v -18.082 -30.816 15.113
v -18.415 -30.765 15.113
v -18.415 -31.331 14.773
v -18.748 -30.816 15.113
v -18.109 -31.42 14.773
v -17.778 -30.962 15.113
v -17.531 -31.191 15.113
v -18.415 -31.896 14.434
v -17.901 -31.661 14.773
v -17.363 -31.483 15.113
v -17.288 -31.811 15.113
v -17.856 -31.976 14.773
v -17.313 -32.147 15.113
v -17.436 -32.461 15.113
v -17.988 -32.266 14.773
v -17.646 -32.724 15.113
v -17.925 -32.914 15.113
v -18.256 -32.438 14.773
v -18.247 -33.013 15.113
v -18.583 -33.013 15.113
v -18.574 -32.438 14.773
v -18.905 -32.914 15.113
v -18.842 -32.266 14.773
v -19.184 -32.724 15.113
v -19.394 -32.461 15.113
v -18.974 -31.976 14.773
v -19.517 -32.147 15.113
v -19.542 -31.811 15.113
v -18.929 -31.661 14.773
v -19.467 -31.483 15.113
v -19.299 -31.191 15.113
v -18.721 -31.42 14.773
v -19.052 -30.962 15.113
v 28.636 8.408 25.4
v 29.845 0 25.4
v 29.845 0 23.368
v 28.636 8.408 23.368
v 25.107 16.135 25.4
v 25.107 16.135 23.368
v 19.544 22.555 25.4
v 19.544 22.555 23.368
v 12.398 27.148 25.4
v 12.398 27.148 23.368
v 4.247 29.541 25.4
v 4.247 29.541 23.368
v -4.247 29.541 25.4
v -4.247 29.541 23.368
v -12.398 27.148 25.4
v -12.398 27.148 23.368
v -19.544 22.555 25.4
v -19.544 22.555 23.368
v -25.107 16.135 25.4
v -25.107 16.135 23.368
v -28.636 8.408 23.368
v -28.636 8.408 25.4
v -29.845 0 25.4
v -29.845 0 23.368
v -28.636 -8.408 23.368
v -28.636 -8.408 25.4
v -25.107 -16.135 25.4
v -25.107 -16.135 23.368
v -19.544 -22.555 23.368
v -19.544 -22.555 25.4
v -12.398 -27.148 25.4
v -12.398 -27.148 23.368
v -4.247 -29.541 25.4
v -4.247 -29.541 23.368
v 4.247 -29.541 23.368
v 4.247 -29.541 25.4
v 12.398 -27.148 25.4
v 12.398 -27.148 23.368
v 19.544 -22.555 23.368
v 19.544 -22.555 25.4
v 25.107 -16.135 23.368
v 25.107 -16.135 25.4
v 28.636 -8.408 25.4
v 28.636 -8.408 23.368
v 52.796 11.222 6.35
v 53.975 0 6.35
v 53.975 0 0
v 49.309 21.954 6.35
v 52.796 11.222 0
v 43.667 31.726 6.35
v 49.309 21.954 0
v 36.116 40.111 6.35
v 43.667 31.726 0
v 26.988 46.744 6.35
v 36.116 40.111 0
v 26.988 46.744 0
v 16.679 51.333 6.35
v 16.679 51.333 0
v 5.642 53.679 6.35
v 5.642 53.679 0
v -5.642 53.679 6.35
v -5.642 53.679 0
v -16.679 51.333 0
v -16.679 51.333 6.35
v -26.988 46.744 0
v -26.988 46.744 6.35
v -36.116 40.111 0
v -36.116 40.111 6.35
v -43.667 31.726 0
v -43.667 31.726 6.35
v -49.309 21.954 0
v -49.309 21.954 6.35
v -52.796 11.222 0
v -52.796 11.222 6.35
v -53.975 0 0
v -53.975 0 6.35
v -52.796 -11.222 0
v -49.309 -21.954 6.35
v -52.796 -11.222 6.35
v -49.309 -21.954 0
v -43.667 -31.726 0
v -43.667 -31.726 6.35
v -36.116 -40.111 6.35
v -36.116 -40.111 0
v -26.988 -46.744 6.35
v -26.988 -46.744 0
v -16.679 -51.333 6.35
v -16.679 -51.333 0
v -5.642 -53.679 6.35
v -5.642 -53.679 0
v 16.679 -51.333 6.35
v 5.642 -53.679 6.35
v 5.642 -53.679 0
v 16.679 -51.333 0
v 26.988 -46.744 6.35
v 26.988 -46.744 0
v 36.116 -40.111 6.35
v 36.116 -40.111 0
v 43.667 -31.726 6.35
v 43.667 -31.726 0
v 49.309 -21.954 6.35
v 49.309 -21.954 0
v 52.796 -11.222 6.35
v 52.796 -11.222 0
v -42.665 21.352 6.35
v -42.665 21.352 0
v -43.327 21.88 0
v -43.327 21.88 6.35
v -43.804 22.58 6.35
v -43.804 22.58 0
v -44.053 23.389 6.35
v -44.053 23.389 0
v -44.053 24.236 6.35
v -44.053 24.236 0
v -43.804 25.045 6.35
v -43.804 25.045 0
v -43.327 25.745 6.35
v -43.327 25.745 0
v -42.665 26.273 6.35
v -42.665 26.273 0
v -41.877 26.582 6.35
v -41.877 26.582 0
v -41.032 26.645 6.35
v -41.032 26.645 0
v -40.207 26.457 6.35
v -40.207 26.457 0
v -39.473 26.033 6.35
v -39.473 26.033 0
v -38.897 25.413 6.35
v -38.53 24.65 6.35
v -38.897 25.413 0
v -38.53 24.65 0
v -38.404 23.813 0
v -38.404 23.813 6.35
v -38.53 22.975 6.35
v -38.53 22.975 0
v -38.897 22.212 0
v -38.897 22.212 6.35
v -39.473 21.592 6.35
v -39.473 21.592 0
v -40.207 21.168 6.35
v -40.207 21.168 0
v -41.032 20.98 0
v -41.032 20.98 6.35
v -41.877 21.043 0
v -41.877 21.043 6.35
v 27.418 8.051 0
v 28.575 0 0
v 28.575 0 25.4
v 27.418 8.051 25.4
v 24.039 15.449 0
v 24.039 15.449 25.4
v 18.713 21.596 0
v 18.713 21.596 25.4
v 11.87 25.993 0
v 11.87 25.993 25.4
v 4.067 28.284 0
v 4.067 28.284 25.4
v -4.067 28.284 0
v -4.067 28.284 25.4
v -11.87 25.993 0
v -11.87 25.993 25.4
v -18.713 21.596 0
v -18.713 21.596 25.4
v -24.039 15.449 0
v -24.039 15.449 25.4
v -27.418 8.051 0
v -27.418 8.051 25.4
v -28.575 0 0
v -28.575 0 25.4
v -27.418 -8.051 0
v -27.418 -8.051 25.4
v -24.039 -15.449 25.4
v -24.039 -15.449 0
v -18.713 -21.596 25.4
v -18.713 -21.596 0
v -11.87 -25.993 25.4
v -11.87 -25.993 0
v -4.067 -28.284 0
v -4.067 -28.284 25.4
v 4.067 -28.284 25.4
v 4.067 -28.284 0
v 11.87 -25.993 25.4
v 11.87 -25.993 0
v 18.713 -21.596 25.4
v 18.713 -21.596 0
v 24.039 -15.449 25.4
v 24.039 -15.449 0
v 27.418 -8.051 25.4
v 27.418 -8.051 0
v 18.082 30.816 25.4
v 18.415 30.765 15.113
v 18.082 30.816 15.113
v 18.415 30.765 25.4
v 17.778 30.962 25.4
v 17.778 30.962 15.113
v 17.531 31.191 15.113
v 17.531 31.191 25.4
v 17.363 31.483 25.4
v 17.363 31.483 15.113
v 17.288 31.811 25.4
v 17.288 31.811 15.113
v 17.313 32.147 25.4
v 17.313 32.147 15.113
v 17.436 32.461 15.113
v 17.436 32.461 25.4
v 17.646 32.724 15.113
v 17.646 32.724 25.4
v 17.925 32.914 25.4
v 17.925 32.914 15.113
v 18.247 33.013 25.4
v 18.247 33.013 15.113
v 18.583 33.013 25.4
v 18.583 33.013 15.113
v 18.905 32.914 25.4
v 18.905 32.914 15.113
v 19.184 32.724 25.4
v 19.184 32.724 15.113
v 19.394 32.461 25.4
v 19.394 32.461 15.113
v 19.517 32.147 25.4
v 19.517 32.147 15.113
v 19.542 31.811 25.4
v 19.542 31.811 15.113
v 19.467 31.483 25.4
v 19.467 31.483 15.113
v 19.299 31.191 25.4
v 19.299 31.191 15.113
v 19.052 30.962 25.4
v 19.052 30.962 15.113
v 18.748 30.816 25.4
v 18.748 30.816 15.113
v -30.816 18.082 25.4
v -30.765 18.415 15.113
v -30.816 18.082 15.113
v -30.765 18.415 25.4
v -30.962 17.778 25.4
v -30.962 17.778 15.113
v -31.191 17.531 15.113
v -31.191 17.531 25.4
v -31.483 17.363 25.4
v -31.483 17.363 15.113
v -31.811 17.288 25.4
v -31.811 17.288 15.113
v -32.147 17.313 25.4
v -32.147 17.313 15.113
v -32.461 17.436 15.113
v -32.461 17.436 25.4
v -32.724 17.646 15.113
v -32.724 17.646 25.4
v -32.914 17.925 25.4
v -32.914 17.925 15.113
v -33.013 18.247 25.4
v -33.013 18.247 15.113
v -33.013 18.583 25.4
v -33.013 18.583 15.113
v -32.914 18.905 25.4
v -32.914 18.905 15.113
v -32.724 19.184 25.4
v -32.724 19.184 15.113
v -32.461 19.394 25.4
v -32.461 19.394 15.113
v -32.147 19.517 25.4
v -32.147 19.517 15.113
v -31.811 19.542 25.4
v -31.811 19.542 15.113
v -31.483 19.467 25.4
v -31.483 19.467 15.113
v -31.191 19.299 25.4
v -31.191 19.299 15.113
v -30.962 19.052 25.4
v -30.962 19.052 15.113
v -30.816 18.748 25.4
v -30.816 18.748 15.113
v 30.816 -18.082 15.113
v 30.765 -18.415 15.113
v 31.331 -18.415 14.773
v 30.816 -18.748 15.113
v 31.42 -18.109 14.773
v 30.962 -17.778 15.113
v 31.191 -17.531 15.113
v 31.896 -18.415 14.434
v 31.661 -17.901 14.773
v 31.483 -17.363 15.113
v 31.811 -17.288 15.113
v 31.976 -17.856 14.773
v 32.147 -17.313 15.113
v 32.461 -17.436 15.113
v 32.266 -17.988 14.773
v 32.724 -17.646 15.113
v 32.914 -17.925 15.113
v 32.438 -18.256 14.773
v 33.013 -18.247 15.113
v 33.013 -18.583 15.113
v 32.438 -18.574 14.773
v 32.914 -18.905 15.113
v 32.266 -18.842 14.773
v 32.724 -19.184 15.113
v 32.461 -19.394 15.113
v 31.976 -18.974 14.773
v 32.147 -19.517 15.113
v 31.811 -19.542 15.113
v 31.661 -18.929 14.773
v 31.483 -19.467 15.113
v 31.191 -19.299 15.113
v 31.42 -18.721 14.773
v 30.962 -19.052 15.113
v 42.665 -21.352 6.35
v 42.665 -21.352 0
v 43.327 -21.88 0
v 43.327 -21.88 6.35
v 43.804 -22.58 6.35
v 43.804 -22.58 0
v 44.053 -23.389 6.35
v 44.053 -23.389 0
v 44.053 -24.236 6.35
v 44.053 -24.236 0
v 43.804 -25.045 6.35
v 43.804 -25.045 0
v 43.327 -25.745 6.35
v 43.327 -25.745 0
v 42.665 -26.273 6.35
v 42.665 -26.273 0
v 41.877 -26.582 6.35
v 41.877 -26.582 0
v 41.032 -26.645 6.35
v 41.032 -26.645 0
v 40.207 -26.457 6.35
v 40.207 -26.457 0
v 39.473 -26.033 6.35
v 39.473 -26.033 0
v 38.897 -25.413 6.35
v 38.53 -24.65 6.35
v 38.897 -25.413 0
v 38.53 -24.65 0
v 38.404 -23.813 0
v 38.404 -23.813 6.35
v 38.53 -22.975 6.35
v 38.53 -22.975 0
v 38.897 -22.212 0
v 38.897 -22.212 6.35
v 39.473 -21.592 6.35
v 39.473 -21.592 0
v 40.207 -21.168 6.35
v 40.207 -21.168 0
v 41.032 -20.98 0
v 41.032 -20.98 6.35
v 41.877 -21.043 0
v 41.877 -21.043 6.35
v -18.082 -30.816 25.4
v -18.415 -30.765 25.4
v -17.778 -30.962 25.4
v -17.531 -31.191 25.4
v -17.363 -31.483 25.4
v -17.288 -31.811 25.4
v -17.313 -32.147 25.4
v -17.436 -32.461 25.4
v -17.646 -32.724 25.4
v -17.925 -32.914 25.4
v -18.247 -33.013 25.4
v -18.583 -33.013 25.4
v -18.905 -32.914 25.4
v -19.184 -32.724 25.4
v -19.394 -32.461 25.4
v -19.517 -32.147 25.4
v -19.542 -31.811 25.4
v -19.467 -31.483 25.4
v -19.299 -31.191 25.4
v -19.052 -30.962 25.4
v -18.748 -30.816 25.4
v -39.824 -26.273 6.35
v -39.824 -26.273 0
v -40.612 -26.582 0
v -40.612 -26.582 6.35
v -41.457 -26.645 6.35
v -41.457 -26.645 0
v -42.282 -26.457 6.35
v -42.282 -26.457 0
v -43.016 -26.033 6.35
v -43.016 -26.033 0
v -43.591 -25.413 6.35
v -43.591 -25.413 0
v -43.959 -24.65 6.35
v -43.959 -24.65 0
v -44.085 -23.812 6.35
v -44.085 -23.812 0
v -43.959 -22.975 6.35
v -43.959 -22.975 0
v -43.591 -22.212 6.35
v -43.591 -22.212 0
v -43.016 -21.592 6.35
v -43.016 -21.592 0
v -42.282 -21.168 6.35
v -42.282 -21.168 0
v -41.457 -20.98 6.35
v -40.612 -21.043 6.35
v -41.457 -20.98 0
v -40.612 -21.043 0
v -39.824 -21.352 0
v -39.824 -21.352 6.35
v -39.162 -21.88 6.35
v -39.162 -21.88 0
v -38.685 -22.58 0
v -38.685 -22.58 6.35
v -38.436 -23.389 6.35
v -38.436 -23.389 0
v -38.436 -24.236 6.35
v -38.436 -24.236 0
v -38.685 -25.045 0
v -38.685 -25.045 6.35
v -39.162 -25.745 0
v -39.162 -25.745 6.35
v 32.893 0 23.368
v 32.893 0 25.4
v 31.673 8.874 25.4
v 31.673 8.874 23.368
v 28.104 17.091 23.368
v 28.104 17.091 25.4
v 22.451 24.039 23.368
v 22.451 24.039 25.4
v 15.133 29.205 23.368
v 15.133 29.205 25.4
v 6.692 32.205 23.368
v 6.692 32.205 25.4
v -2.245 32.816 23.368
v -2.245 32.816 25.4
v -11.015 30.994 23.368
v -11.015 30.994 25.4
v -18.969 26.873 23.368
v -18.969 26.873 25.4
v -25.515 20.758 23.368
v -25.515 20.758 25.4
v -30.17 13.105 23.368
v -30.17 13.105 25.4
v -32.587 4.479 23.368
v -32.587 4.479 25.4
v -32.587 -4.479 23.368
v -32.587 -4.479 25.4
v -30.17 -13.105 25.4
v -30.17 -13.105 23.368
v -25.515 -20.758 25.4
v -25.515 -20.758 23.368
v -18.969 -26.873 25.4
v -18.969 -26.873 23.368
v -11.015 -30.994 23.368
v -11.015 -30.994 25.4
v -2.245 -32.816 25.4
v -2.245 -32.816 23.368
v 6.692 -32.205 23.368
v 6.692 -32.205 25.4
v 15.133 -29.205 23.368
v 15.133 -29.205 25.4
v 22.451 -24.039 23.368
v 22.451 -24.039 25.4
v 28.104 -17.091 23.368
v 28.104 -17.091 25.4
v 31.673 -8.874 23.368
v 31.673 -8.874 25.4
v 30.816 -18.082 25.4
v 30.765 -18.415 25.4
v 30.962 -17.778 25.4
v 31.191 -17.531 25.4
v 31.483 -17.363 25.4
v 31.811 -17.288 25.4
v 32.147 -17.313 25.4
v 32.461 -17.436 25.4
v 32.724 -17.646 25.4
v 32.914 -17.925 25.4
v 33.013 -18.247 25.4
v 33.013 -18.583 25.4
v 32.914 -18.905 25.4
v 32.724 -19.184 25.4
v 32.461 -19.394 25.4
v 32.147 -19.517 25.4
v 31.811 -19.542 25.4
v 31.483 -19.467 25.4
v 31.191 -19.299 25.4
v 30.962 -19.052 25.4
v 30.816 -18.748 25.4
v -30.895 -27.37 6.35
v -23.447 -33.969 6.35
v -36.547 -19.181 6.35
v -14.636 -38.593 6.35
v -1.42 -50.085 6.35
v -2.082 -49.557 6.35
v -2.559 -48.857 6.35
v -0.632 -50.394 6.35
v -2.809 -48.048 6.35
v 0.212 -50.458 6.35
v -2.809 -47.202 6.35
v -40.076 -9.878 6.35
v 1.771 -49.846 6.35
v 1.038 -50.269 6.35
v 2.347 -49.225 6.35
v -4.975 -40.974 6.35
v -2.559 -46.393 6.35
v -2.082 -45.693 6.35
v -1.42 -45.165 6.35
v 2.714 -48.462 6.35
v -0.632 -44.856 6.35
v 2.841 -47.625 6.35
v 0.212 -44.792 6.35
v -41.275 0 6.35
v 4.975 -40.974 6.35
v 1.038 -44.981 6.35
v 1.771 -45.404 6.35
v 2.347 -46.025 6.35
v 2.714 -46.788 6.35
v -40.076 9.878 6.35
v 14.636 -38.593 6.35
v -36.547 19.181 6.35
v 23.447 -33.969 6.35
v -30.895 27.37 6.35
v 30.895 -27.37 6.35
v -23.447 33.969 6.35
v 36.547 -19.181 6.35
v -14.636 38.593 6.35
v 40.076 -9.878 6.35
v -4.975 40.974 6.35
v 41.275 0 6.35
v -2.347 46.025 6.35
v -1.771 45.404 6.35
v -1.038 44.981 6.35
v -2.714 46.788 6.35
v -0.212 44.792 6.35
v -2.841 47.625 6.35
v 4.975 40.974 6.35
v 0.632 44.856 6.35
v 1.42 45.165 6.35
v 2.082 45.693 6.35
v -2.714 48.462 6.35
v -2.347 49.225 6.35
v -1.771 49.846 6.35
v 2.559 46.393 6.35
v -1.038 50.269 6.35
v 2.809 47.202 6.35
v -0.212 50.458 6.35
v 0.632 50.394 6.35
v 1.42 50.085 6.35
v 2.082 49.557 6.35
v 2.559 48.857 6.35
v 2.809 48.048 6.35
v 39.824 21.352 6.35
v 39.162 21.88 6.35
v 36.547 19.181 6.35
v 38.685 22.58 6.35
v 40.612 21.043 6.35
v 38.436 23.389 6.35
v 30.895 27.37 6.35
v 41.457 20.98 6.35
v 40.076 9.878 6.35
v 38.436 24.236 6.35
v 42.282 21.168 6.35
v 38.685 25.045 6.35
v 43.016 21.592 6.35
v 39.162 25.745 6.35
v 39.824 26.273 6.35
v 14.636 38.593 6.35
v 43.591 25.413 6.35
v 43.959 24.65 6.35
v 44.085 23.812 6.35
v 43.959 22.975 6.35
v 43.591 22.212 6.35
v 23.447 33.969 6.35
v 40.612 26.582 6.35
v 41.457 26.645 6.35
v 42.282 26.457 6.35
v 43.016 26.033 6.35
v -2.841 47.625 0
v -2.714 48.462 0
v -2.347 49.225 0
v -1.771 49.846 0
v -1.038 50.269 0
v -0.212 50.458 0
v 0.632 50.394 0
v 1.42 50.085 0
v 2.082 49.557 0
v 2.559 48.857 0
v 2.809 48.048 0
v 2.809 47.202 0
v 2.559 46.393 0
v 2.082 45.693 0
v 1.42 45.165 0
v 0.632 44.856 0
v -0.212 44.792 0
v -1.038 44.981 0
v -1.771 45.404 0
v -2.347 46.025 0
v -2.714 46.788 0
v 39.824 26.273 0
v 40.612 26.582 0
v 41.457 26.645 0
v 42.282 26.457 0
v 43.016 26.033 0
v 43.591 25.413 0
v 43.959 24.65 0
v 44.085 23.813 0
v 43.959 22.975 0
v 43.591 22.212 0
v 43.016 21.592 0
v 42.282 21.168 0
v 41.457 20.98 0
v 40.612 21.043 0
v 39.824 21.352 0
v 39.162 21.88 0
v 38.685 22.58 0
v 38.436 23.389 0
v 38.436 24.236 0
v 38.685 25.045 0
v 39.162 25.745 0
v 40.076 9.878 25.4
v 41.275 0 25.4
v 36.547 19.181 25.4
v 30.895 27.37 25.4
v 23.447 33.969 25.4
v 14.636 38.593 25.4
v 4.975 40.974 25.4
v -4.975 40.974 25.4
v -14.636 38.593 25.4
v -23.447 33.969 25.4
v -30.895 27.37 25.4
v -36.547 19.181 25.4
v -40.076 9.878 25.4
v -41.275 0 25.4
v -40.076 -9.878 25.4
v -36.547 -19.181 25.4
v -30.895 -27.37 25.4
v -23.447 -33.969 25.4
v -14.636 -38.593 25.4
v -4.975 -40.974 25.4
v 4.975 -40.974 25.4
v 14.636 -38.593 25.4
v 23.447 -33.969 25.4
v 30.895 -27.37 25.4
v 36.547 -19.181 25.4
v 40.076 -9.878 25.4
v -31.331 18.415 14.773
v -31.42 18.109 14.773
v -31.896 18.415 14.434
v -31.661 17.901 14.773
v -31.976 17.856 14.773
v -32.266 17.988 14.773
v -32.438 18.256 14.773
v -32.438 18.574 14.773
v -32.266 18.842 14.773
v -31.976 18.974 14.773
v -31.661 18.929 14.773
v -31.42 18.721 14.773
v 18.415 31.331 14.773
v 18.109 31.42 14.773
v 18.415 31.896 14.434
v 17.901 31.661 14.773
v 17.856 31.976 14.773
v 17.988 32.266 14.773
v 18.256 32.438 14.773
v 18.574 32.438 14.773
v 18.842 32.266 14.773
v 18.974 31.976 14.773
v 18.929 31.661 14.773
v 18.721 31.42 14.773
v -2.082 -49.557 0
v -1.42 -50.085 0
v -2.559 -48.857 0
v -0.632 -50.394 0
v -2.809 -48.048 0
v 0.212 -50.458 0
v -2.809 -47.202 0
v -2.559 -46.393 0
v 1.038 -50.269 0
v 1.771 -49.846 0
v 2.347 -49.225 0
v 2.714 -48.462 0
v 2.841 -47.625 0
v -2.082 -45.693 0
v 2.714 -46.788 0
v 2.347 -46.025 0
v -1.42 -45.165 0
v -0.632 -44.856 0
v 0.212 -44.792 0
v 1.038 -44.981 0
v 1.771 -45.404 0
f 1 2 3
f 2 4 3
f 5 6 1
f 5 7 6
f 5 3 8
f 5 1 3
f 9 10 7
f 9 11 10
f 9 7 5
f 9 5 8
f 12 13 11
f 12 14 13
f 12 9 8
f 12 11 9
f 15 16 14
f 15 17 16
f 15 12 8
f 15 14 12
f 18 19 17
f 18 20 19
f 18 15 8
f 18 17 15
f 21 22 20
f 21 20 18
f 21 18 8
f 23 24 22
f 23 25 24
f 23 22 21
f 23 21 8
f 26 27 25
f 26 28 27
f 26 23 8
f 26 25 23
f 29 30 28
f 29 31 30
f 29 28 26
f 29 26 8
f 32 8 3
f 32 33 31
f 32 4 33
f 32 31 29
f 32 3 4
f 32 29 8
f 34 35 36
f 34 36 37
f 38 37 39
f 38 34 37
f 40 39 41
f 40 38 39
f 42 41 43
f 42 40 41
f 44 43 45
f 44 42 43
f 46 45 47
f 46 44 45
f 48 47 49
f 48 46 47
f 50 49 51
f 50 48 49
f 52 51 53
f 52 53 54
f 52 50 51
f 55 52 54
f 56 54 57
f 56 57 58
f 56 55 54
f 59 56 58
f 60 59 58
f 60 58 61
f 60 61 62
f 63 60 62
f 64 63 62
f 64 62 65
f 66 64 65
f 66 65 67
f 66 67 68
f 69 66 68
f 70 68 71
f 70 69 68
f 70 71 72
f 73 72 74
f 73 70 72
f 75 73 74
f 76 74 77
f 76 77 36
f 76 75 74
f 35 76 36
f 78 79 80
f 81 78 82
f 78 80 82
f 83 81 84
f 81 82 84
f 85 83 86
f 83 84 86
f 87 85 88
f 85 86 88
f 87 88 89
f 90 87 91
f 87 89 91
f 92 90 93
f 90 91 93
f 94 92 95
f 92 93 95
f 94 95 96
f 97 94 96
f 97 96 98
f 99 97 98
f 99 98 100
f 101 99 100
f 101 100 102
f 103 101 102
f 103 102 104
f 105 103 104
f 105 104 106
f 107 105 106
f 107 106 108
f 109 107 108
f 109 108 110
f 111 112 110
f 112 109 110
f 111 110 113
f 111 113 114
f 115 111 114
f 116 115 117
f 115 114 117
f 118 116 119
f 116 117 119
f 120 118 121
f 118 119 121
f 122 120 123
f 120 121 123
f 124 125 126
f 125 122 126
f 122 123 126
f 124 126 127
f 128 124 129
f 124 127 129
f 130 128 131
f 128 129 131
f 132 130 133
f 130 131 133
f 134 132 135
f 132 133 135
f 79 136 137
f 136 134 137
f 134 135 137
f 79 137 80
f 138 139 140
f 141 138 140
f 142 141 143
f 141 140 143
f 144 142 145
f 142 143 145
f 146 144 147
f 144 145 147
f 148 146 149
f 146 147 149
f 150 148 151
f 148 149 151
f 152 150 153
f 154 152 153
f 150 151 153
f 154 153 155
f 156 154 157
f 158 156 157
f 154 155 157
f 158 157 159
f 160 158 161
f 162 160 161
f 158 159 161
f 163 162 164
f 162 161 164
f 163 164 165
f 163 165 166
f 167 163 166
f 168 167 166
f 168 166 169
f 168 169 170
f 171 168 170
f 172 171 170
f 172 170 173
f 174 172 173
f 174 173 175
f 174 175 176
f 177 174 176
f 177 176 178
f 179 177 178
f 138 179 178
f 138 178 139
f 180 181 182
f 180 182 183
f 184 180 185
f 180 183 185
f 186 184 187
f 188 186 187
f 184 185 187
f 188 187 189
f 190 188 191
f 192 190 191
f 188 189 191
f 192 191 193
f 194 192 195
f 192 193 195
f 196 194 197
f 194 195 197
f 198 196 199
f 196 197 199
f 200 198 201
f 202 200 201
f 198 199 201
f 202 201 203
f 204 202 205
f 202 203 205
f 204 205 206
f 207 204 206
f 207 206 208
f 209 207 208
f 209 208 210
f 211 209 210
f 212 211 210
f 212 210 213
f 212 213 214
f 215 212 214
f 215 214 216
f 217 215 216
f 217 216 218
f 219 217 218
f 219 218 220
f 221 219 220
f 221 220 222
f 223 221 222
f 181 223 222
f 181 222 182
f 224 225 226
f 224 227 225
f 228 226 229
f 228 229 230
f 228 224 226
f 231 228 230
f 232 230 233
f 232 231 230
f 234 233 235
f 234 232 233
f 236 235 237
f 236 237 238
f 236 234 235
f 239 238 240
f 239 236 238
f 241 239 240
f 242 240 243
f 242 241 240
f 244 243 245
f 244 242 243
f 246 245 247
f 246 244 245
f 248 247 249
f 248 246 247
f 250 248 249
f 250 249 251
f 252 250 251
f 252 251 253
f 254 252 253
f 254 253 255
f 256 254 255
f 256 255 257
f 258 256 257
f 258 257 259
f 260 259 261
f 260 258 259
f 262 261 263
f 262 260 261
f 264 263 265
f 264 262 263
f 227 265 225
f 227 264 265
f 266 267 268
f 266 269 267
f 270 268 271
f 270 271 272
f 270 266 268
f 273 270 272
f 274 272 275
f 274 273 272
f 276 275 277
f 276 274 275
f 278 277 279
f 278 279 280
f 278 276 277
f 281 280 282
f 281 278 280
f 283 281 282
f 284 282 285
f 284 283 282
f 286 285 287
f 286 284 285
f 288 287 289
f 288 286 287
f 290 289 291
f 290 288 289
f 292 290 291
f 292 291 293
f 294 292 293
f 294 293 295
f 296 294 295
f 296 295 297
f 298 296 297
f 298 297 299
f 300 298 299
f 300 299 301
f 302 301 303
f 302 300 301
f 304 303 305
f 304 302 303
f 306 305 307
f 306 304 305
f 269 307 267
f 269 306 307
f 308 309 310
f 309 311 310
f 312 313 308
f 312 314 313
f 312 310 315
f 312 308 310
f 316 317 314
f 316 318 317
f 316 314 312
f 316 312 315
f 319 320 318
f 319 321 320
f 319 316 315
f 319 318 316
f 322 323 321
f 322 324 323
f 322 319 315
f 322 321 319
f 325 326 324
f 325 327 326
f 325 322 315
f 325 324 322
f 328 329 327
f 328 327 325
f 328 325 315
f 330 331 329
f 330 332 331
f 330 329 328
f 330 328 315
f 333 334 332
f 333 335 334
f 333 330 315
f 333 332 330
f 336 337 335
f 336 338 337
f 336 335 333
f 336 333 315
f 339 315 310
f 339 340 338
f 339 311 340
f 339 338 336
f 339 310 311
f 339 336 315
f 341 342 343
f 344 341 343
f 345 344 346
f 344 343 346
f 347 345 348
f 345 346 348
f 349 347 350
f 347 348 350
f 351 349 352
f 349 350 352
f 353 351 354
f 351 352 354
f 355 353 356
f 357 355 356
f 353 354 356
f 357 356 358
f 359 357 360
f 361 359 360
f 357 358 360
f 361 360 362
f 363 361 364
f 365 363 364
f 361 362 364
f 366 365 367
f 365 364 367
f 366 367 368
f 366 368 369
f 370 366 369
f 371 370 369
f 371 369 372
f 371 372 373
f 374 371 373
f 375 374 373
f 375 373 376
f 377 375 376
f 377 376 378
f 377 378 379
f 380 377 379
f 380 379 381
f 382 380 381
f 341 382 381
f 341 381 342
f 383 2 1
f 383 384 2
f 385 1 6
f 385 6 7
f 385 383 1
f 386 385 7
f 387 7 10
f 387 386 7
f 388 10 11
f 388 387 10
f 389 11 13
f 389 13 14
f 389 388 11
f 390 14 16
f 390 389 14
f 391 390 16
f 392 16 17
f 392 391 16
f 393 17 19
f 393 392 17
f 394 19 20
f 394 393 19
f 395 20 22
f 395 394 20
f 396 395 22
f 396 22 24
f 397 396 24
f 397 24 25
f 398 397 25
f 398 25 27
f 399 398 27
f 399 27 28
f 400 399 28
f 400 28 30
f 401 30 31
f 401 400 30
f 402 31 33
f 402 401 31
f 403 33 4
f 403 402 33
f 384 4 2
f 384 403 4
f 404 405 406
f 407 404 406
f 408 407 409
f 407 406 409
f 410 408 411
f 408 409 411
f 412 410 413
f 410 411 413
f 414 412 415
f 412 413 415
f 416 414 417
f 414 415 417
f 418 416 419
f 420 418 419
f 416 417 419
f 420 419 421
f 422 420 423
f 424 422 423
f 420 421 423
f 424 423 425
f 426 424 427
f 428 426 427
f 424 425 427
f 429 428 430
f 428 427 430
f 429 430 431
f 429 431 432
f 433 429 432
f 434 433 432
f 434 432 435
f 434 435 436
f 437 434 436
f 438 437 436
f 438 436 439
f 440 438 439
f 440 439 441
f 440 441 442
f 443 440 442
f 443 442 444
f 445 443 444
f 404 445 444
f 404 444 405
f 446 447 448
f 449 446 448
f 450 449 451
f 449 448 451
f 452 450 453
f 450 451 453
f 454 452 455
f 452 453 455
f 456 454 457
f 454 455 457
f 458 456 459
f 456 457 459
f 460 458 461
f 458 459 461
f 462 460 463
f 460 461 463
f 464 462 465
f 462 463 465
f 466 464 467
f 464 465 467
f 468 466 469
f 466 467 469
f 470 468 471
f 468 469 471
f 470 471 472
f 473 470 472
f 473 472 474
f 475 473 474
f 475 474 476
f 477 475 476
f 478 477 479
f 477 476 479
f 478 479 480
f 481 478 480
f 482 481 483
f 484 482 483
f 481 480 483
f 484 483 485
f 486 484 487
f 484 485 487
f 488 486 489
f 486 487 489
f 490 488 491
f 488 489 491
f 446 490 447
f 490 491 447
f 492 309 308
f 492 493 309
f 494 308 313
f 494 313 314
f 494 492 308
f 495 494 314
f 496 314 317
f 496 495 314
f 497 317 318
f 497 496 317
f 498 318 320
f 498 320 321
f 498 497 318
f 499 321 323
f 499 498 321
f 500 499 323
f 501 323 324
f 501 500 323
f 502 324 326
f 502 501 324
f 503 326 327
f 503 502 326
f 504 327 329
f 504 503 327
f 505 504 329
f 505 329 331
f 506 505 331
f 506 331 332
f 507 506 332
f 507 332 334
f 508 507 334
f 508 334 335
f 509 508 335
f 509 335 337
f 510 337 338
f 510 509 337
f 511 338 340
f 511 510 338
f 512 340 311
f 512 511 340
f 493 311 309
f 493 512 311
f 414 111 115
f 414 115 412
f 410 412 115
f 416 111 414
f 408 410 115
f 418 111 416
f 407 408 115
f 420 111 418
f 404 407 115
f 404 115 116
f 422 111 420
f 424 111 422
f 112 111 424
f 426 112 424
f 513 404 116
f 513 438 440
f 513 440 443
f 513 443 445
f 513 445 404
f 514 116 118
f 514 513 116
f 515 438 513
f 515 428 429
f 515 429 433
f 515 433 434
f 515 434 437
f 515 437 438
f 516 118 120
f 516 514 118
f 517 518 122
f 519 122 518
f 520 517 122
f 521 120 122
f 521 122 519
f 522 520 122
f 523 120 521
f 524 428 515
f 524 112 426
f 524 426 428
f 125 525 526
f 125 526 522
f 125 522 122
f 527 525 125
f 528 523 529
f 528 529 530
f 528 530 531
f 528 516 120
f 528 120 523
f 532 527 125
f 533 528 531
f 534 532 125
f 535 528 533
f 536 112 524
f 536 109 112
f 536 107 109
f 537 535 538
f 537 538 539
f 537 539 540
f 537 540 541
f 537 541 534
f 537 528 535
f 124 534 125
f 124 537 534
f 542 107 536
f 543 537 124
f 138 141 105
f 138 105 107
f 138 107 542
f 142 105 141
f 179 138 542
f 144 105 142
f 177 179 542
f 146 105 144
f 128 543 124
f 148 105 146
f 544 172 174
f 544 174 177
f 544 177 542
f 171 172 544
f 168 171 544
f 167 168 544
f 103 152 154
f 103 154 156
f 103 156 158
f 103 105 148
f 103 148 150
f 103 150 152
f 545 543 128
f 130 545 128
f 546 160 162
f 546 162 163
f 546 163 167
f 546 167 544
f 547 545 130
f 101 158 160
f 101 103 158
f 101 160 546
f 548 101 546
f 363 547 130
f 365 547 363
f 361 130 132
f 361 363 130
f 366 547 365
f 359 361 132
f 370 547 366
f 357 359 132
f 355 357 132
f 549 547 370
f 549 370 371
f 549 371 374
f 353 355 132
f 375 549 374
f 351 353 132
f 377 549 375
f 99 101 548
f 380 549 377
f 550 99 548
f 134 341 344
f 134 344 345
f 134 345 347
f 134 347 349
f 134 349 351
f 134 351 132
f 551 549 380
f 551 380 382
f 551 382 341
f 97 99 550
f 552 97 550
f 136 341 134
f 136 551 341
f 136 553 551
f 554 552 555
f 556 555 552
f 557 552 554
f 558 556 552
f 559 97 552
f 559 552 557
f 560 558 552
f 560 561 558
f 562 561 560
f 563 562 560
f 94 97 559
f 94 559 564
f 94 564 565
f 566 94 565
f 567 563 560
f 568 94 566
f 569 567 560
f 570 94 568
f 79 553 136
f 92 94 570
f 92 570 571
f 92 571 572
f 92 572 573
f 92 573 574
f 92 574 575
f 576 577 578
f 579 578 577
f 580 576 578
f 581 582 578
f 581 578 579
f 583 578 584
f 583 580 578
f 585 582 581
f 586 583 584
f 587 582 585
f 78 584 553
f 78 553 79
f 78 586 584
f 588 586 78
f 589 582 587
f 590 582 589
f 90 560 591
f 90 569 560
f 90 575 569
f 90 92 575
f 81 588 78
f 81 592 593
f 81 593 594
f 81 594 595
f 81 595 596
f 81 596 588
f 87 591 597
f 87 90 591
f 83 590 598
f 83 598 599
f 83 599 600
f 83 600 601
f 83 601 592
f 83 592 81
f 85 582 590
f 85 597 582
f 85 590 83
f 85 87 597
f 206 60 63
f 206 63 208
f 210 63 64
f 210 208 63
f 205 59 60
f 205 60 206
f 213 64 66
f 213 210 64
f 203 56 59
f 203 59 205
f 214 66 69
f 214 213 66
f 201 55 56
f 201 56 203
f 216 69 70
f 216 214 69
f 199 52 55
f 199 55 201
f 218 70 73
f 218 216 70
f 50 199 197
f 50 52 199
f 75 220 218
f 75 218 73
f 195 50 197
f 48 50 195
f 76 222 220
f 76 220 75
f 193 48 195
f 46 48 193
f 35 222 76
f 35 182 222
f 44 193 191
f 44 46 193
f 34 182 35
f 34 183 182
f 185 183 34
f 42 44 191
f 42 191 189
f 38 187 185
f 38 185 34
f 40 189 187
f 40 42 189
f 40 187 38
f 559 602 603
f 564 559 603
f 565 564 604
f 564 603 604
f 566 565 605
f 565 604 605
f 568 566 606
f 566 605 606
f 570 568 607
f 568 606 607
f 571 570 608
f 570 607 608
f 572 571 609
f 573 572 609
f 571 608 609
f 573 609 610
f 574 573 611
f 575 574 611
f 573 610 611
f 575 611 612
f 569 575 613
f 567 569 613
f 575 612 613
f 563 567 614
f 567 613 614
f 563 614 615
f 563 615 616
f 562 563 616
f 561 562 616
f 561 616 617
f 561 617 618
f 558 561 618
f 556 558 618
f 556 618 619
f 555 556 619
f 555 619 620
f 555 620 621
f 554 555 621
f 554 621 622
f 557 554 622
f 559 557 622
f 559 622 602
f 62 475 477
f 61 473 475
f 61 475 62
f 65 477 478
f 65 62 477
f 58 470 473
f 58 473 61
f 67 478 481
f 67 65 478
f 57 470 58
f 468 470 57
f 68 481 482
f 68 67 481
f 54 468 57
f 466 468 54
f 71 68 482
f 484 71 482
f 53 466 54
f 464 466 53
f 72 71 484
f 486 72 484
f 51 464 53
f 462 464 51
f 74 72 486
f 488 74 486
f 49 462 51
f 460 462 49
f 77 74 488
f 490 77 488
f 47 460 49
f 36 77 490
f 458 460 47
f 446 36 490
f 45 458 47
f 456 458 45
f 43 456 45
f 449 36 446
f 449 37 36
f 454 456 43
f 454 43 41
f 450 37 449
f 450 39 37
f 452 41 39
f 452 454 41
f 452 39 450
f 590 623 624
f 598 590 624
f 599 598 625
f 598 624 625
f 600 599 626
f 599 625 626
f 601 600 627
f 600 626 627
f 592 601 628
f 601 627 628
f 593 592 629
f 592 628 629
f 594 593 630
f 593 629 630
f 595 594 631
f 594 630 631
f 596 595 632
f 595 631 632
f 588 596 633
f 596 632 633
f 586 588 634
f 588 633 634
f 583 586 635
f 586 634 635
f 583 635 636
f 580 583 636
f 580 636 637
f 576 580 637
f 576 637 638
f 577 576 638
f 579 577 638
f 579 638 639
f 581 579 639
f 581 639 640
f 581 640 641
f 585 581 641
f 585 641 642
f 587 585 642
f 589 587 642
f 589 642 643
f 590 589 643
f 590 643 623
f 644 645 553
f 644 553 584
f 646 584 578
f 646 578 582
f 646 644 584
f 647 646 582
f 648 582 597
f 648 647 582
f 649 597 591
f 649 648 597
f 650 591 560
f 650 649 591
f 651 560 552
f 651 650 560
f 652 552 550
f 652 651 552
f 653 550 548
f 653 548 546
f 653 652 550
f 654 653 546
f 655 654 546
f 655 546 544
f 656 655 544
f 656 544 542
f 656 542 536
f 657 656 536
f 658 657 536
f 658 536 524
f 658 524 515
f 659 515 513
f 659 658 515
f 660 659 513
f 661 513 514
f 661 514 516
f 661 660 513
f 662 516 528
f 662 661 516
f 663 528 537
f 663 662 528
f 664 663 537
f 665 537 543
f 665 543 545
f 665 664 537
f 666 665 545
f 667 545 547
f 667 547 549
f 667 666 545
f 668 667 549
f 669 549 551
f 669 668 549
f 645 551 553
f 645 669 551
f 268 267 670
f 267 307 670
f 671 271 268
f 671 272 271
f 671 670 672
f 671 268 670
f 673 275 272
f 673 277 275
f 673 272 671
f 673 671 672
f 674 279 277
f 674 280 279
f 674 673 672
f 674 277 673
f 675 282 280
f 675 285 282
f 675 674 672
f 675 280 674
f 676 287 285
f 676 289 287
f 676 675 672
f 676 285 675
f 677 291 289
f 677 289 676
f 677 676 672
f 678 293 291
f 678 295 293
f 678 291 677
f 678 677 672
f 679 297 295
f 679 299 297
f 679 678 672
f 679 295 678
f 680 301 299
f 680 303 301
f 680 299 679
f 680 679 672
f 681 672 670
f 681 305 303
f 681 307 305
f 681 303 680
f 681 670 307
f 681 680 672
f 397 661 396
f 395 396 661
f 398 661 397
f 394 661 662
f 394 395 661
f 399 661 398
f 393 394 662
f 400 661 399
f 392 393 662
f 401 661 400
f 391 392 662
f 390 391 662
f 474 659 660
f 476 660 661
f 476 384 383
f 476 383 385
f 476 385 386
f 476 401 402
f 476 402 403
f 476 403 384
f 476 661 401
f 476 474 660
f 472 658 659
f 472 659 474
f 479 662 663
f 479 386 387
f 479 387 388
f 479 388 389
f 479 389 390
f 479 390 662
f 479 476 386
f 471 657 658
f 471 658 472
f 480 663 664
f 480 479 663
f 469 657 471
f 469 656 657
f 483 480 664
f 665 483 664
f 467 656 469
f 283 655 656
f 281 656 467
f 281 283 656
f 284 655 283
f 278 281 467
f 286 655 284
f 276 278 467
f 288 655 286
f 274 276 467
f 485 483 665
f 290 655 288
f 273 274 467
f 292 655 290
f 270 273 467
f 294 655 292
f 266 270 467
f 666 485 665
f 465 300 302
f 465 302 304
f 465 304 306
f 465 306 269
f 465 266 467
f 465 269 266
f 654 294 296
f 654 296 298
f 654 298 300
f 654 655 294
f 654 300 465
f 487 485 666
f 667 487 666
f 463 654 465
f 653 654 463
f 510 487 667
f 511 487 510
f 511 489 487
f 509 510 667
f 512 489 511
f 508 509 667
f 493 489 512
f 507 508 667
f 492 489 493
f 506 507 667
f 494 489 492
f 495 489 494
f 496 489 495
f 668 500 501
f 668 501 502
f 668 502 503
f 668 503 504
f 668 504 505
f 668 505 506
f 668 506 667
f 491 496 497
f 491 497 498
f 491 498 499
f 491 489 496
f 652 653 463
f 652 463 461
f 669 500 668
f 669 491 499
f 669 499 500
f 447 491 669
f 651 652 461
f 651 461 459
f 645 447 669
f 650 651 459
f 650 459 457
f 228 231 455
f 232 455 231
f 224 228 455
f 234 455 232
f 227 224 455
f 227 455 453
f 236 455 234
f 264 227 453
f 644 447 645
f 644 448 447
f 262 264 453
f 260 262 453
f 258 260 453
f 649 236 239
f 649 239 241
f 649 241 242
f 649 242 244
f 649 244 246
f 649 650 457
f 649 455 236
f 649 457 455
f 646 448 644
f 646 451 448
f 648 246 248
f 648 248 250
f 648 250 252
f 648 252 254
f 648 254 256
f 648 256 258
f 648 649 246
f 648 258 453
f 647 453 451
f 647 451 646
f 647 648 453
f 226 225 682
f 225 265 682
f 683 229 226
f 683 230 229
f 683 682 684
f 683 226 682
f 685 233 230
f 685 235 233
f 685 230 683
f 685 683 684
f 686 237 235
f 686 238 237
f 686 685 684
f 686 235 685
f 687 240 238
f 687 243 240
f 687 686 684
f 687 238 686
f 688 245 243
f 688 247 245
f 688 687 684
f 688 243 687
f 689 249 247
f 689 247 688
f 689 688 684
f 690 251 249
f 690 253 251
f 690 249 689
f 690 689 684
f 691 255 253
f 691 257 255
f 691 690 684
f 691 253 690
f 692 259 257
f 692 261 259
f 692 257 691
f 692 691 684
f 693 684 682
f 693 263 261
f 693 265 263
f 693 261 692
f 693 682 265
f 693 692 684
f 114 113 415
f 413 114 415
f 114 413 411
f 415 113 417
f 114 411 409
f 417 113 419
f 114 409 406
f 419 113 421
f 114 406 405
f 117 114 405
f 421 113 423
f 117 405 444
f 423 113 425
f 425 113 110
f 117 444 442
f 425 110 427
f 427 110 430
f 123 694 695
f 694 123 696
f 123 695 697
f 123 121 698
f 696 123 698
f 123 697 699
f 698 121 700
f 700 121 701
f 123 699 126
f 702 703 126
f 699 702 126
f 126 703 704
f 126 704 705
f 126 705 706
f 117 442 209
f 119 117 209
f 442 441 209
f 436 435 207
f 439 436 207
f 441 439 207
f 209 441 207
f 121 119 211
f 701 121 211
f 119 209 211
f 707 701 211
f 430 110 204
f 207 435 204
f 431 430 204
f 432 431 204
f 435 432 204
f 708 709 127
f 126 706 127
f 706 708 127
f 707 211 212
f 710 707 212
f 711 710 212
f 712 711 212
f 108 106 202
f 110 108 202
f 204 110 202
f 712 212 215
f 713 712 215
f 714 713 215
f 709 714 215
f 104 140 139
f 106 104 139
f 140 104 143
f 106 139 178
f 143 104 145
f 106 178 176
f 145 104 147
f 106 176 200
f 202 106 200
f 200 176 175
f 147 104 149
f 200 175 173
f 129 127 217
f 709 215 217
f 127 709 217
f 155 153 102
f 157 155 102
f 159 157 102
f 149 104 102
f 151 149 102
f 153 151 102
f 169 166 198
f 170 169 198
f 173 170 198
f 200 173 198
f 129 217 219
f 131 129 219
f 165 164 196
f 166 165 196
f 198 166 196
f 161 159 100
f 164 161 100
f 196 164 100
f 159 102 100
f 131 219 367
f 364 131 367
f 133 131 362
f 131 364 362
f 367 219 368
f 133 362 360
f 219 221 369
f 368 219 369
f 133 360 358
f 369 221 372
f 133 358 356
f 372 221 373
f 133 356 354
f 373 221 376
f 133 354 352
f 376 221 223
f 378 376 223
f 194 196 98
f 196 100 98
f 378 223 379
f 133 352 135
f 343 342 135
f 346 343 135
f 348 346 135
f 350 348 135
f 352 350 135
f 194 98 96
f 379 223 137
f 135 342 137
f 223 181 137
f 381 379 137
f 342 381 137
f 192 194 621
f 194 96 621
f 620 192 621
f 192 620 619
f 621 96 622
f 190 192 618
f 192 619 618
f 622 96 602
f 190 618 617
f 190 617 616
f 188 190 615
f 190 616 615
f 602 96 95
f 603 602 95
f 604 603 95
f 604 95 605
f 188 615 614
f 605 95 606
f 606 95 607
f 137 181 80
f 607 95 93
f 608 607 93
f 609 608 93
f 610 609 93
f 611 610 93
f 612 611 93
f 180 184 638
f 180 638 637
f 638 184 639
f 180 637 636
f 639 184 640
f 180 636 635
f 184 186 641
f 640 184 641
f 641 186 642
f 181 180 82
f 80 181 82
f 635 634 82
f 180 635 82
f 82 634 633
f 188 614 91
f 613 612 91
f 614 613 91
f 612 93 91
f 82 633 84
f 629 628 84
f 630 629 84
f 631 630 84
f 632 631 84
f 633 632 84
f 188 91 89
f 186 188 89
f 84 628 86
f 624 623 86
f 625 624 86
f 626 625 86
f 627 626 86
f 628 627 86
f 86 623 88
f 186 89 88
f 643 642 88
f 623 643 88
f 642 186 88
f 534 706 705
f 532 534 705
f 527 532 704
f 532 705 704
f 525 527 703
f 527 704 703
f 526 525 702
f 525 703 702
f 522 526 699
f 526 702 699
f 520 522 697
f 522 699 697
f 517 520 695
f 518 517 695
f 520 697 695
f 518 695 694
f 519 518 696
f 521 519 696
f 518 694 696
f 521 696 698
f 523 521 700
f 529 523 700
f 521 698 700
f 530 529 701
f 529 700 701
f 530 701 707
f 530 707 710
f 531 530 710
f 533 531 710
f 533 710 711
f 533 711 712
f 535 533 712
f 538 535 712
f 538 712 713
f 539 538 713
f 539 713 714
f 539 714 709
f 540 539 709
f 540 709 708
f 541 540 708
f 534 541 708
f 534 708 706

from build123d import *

# Parameters (mm, degrees)
SKETCH1_R           = 53.975
BOSS_EXTRUDE1_DEPTH = 25.4
SKETCH2_OUTSIDE_W   = 140.902
SKETCH2_OUTSIDE_H   = 140.902
SKETCH2_OUTSIDE_R   = 41.275
CUT_EXTRUDE1_DEPTH  = 19.05
SKETCH3_R           = 28.575
CUT_EXTRUDE2_DEPTH  = 26.4
SKETCH6_R           = 32.893
SKETCH6_R_2         = 29.845
CUT_EXTRUDE3_DEPTH  = 2.032
CIRPATTERN2_COUNT   = 4
SKETCH9_R           = 2.840620424
CUT_EXTRUDE4_DEPTH  = 26.4
CIRPATTERN4_COUNT   = 6


with BuildPart() as part:
    # Sketch1 → Boss-Extrude1 (new body)
    with BuildSketch(Plane.XY):
        Circle(SKETCH1_R)
    extrude(amount=BOSS_EXTRUDE1_DEPTH)

    # Sketch2 outside → Cut-Extrude1 (cut)
    with BuildSketch(Plane.XY.offset(25.4)):
        Rectangle(SKETCH2_OUTSIDE_W, SKETCH2_OUTSIDE_H)
        Circle(SKETCH2_OUTSIDE_R, mode=Mode.SUBTRACT)
    extrude(amount=-CUT_EXTRUDE1_DEPTH, mode=Mode.SUBTRACT)

    # Sketch3 → Cut-Extrude2 (cut, through all)
    with BuildSketch(Plane.XY.offset(25.4)):
        Circle(SKETCH3_R)
    extrude(amount=-CUT_EXTRUDE2_DEPTH, mode=Mode.SUBTRACT)

    # Sketch6 → Cut-Extrude3 (cut)
    with BuildSketch(Plane.XY.offset(25.4)):
        Circle(SKETCH6_R)
        Circle(SKETCH6_R_2, mode=Mode.SUBTRACT)
    extrude(amount=-CUT_EXTRUDE3_DEPTH, mode=Mode.SUBTRACT)

    # Sketch8 → #4-40 Tapped Hole1 (revolve, cut)
    with BuildSketch(Plane(origin=(18.415, 31.895715621, 25.4), x_dir=(0, -1, 0), z_dir=(1, 0, 0))):
        Polygon((0, 0), (0, 10.966152758), (1.1303, 10.287), (1.1303, 0), align=None)
    f_4_40_tapped_hole1 = revolve(axis=Axis((18.415, 31.895715621, 31.75), (0, 0, -1)), mode=Mode.SUBTRACT)

    # CirPattern2: #4-40 Tapped Hole1 ×4 about axis
    cirpattern2_axis = Axis((0, 0, 0), (0, 0, 1))
    for i in range(1, CIRPATTERN2_COUNT):
        add(f_4_40_tapped_hole1.rotate(cirpattern2_axis, i * 360 / CIRPATTERN2_COUNT), mode=Mode.SUBTRACT)

    # Sketch9 → Cut-Extrude4 (cut, through all)
    with BuildSketch(Plane(origin=(0, 0, 0), x_dir=(-1, 0, 0), z_dir=(0, 0, -1))):
        with Locations((0, 47.625)):
            Circle(SKETCH9_R)
    cut_extrude4 = extrude(amount=-CUT_EXTRUDE4_DEPTH, mode=Mode.SUBTRACT)

    # CirPattern4: Cut-Extrude4 ×6 about axis
    cirpattern4_axis = Axis((0, 0, 0), (0, 0, 1))
    for i in range(1, CIRPATTERN4_COUNT):
        add(cut_extrude4.rotate(cirpattern4_axis, i * 360 / CIRPATTERN4_COUNT), mode=Mode.SUBTRACT)


solid = part.part
